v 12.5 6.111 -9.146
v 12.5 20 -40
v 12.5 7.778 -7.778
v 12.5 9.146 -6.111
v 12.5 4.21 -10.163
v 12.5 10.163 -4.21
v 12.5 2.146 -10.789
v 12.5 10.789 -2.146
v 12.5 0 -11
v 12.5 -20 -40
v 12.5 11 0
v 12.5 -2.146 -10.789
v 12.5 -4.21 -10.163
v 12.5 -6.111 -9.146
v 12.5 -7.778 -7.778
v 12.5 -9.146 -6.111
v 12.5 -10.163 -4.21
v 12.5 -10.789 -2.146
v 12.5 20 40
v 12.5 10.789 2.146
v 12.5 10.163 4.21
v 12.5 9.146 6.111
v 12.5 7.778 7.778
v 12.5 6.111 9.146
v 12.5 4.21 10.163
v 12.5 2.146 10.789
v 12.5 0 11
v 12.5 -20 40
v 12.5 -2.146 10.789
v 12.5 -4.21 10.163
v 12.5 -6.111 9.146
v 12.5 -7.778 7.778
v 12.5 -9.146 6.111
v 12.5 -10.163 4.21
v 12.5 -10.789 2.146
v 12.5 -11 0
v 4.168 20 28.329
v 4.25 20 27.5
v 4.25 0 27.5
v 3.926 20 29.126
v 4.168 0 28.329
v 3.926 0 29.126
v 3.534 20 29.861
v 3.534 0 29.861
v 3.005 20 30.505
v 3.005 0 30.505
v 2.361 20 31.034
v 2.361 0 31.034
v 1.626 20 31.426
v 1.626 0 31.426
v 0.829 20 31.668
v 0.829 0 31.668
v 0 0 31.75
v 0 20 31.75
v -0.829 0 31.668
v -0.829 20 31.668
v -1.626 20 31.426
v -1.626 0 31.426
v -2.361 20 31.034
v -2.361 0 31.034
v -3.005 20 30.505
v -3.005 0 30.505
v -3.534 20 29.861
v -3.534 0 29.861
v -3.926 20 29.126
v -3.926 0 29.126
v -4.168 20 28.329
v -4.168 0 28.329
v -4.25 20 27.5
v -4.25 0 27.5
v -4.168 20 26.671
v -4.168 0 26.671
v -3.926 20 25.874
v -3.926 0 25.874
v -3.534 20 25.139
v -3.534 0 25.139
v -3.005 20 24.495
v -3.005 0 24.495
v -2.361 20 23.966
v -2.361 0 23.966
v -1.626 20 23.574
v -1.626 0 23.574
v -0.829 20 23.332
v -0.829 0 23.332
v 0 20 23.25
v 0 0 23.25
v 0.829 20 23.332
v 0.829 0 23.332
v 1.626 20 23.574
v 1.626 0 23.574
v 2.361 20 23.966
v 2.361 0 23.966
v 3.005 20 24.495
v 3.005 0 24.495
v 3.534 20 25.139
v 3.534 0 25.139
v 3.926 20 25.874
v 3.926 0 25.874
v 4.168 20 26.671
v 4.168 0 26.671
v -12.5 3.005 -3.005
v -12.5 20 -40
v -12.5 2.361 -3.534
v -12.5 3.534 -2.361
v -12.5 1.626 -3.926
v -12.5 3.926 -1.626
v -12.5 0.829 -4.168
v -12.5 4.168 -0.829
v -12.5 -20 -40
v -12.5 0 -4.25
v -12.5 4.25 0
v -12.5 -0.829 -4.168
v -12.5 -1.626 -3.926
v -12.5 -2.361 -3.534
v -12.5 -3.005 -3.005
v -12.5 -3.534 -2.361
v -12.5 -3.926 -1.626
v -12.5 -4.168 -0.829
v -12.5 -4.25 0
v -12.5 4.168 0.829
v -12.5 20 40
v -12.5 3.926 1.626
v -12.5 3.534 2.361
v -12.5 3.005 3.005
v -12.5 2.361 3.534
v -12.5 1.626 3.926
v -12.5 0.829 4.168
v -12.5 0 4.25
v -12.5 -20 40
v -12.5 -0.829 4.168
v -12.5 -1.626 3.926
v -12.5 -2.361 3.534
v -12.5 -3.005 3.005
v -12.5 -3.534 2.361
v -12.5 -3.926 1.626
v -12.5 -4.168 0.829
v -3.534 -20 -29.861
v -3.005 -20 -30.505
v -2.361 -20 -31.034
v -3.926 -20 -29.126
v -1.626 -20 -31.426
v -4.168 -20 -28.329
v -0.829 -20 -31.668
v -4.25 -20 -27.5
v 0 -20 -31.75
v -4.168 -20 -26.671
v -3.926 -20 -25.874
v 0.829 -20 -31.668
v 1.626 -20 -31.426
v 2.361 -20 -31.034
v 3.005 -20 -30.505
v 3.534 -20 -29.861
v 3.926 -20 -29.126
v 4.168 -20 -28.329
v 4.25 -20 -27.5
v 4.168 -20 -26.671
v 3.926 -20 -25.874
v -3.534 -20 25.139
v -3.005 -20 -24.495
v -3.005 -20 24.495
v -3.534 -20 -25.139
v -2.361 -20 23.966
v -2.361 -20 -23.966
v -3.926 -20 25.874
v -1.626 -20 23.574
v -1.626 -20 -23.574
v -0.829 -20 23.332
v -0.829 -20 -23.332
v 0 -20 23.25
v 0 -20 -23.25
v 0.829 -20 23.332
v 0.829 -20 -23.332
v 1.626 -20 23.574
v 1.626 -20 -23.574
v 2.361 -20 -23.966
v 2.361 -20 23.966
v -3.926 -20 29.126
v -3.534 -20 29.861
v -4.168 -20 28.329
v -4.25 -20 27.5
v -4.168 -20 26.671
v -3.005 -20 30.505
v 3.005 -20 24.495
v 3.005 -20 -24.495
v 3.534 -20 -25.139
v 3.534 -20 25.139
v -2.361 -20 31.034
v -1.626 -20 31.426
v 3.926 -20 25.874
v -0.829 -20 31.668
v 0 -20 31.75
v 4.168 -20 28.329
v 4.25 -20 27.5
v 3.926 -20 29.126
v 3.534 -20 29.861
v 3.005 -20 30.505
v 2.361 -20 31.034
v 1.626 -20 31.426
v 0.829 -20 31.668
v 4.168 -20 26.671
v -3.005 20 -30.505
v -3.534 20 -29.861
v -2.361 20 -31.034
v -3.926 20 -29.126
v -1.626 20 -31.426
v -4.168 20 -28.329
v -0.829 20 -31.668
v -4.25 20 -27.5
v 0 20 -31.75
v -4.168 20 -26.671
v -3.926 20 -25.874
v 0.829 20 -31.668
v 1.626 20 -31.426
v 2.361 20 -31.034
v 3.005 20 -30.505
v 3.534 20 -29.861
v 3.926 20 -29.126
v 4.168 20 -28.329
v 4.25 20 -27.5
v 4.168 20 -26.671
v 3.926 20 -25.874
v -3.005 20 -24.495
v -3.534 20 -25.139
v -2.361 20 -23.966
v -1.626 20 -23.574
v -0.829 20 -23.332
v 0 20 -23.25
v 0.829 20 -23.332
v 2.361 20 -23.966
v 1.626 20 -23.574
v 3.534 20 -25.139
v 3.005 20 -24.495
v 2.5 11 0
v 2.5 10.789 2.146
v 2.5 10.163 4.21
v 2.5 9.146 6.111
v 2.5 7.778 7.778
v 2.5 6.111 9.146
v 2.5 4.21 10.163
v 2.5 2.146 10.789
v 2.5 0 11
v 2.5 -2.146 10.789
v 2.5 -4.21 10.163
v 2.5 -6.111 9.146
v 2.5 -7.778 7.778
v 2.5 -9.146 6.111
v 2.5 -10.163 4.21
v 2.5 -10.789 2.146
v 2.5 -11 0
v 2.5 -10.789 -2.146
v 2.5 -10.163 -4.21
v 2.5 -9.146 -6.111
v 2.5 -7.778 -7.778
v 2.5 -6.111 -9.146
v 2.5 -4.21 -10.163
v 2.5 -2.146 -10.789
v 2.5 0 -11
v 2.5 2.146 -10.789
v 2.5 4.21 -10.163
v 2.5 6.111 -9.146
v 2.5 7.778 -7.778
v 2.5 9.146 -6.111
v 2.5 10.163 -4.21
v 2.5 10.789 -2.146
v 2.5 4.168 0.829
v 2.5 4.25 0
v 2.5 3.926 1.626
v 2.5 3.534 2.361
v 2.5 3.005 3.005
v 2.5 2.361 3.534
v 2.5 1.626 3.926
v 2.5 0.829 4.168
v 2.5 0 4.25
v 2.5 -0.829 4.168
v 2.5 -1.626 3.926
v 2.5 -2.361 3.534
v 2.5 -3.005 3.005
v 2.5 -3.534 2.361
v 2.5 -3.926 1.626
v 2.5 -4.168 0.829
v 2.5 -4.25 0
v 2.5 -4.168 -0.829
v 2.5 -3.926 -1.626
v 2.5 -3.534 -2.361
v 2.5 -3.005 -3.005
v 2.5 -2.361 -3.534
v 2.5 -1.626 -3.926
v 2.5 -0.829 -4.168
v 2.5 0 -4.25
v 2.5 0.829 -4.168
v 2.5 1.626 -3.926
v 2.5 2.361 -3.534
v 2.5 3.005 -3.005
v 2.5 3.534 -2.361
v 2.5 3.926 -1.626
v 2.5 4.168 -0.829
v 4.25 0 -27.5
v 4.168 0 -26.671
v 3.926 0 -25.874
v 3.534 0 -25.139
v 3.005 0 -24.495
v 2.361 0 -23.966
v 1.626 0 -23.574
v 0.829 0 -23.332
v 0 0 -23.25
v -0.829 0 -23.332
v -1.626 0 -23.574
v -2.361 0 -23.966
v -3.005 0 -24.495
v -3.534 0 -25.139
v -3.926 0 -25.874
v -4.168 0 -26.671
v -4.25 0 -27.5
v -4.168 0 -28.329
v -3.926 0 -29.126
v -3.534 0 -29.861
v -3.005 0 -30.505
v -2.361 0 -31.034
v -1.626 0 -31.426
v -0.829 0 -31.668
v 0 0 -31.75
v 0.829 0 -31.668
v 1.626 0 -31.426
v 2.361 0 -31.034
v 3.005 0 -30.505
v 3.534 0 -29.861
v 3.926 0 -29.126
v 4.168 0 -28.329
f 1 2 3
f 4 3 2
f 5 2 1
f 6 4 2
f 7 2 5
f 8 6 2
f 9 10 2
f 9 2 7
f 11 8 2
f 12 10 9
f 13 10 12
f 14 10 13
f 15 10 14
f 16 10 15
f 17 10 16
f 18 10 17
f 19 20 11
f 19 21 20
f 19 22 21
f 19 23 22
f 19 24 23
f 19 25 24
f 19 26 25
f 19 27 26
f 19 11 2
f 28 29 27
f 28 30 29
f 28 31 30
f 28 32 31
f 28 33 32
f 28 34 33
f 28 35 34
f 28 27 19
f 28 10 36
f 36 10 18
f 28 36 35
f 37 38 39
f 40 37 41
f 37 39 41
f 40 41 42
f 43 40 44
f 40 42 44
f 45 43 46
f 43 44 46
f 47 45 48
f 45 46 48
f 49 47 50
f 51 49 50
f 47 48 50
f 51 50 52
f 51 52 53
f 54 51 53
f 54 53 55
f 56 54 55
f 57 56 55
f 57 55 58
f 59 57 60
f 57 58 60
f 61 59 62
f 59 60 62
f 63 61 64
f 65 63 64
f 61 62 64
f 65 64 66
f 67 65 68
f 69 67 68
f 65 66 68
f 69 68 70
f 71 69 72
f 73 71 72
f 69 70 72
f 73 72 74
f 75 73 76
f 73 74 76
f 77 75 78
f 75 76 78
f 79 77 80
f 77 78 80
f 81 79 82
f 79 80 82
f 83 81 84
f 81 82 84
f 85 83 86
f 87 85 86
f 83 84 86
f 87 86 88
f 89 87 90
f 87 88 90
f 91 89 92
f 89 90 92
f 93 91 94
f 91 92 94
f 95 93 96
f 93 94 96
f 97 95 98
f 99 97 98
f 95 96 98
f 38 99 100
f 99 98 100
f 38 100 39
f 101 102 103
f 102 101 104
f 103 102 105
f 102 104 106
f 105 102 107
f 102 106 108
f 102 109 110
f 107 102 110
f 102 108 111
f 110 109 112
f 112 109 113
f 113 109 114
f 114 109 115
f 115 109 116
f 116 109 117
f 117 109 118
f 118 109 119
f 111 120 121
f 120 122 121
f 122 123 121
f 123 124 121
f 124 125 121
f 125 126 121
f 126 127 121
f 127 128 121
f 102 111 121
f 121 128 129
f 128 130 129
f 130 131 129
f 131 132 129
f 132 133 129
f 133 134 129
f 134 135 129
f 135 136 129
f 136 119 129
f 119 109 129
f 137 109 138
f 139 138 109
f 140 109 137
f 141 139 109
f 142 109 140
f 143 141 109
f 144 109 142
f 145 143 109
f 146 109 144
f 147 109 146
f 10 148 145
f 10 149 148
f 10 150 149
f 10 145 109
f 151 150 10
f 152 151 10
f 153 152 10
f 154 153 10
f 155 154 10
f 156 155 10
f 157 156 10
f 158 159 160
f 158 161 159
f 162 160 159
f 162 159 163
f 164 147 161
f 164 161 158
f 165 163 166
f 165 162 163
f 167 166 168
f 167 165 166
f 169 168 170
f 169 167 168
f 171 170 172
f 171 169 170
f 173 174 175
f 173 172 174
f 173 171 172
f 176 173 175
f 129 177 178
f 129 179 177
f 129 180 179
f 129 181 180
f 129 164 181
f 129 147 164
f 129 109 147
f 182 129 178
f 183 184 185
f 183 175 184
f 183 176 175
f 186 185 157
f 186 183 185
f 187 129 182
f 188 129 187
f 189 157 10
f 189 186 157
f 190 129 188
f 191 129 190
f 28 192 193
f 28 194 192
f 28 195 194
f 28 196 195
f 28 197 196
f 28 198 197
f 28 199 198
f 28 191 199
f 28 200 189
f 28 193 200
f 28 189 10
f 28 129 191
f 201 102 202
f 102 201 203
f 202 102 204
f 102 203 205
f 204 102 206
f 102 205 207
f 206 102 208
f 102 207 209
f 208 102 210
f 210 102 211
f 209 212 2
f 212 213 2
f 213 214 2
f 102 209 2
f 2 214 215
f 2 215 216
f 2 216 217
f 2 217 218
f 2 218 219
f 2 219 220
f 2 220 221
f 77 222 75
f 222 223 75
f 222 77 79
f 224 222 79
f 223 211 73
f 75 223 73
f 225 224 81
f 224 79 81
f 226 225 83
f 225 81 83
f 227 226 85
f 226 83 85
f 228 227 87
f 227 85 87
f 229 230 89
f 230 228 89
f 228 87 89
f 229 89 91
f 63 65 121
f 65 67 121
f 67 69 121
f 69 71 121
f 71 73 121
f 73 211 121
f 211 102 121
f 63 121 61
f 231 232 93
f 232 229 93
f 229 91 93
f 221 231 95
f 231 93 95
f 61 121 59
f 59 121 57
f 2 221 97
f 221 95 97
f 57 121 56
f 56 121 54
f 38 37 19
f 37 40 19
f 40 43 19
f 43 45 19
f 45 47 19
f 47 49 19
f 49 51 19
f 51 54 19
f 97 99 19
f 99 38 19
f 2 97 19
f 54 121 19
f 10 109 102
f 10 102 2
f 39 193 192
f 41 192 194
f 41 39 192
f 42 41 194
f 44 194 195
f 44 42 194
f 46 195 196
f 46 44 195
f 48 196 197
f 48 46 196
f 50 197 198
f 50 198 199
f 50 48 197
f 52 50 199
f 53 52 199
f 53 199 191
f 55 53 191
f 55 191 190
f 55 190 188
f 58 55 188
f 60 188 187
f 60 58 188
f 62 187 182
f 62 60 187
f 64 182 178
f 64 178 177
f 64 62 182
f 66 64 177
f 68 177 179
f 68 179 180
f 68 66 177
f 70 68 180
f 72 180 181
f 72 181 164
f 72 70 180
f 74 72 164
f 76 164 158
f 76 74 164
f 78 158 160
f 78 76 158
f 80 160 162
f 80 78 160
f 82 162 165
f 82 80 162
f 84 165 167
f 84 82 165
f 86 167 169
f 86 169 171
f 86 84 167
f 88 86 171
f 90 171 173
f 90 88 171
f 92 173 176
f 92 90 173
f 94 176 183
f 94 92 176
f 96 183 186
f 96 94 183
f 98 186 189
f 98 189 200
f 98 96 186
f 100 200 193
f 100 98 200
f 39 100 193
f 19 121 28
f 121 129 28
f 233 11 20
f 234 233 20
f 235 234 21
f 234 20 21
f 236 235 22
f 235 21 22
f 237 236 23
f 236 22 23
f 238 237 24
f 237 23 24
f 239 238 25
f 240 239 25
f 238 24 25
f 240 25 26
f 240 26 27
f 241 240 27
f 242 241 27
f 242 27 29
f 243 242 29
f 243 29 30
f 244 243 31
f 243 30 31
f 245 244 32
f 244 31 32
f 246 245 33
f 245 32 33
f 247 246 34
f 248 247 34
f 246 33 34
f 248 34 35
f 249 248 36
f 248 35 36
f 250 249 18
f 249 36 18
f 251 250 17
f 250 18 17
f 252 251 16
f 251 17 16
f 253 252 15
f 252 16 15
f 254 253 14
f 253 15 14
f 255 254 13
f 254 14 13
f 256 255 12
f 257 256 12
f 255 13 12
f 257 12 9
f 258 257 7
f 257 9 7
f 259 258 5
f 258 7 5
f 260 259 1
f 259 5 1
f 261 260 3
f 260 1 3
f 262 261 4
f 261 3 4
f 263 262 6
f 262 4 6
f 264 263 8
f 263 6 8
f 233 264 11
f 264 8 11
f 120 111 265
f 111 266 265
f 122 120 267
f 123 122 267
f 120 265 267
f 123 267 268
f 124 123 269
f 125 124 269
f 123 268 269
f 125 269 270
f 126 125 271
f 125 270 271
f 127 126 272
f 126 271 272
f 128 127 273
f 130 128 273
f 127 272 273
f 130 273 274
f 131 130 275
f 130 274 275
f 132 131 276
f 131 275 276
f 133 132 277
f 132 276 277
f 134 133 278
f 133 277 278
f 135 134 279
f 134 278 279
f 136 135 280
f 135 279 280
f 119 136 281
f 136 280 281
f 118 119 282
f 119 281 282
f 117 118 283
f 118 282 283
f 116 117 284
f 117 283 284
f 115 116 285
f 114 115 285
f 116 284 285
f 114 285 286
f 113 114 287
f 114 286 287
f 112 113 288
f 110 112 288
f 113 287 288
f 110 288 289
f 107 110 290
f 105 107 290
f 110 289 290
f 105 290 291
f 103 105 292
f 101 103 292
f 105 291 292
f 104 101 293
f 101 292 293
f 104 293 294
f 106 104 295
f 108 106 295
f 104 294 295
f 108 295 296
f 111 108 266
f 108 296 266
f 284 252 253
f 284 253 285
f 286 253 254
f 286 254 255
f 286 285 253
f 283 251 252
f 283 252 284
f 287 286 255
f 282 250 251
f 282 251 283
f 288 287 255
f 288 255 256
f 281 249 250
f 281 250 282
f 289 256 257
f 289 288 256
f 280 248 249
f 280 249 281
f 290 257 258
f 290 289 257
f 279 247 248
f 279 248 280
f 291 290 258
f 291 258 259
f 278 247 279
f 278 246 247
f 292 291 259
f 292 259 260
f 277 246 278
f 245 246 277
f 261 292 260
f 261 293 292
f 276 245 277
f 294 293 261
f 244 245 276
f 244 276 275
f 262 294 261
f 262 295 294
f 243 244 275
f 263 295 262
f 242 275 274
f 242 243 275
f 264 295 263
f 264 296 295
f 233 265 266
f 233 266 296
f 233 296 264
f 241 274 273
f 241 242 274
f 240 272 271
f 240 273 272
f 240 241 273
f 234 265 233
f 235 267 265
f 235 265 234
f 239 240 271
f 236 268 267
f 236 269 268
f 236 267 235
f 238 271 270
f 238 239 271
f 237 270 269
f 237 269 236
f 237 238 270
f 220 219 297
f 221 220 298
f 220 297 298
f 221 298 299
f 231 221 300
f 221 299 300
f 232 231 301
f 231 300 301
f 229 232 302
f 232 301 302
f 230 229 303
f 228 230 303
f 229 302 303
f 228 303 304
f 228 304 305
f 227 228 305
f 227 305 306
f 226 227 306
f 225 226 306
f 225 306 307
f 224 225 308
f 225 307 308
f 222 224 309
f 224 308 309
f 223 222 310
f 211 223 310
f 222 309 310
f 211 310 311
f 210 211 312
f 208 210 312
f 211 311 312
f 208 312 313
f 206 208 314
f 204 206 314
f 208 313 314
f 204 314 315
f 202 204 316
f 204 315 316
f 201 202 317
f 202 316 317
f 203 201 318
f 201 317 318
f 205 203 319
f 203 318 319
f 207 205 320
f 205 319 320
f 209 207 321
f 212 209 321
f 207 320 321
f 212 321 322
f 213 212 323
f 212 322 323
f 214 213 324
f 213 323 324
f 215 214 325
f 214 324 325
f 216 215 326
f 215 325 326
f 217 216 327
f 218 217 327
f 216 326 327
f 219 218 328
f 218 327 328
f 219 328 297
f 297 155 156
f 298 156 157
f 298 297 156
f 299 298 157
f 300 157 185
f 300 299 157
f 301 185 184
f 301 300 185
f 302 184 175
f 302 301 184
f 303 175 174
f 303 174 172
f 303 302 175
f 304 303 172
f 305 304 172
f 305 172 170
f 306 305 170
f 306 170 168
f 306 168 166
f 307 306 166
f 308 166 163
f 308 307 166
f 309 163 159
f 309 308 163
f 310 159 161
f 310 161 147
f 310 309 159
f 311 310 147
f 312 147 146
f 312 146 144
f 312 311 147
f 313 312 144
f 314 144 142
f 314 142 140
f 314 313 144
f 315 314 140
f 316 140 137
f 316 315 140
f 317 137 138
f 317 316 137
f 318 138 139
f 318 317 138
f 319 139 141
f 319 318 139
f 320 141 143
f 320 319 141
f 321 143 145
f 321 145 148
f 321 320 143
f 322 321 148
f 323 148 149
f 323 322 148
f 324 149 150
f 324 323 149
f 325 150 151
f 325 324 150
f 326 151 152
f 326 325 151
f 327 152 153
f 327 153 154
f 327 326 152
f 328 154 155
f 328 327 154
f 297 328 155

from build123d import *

# Parameters (mm, degrees)
F0_W          = 25
F0_H          = 80
F0_R          = 4.25
F1_DEPTH      = 20
F1_DEPTH_BACK = 20
F2_R          = 4.25
F3_DEPTH      = 12.5
F4_R          = 11
F5_DEPTH      = 10
F6_R          = 4.25
F7_DEPTH      = 25


with BuildPart() as f1:
    # F0 (on Front) → F1 (new body, two sides)
    with BuildSketch(Plane.XZ) as f1_sk:
        Rectangle(F0_W, F0_H)
        with Locations((0, -27.5)):
            Circle(F0_R, mode=Mode.SUBTRACT)
        with Locations((0, 27.5)):
            Circle(F0_R, mode=Mode.SUBTRACT)
    extrude(amount=F1_DEPTH)
    extrude(f1_sk.sketch, amount=-F1_DEPTH_BACK)

    # F2 (on Right) → F3 (cut, through all)
    with BuildSketch(Plane.YZ):
        Circle(F2_R)
    extrude(amount=-F3_DEPTH, mode=Mode.SUBTRACT)

    # F4 (on face) → F5 (cut)
    with BuildSketch(Plane.YZ.offset(12.5)):
        Circle(F4_R)
    extrude(amount=-F5_DEPTH, mode=Mode.SUBTRACT)

    # F6 (on face) → F7 (cut)
    with BuildSketch(Plane.YZ.offset(12.5)):
        Circle(F6_R)
    extrude(amount=-F7_DEPTH, mode=Mode.SUBTRACT)


solid = f1.part
